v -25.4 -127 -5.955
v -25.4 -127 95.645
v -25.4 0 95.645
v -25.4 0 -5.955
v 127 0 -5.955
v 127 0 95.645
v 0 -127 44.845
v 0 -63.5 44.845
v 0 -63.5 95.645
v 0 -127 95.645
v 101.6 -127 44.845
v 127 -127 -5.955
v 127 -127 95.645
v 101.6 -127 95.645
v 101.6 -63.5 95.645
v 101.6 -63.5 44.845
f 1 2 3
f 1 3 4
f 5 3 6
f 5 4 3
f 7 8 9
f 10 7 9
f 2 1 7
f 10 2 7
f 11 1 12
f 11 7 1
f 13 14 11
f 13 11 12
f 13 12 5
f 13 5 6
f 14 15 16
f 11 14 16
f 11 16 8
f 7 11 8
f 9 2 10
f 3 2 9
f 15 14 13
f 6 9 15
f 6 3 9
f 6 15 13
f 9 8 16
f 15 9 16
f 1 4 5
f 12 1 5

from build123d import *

# Parameters (mm, degrees)
F1_DEPTH = 127
F2_W     = 101.6
F2_H     = 63.5
F3_DEPTH = 50.8


with BuildPart() as f1:
    # F0 (on Front) → F1 (new body)
    with BuildSketch(Plane.XZ):
        Polygon((-25.4, 95.645057), (-25.4, -5.954943), (127, -5.954943), (127, 95.645057), (101.6, 95.645057), (101.6, 44.845057), (0, 44.845057), (0, 95.645057), align=None)
    extrude(amount=F1_DEPTH)

    # F2 (on face) → F3 (join)
    with BuildSketch(Plane.XY.offset(44.845057)):
        with Locations((50.8, -31.75)):
            Rectangle(F2_W, F2_H)
    extrude(amount=F3_DEPTH)


solid = f1.part
